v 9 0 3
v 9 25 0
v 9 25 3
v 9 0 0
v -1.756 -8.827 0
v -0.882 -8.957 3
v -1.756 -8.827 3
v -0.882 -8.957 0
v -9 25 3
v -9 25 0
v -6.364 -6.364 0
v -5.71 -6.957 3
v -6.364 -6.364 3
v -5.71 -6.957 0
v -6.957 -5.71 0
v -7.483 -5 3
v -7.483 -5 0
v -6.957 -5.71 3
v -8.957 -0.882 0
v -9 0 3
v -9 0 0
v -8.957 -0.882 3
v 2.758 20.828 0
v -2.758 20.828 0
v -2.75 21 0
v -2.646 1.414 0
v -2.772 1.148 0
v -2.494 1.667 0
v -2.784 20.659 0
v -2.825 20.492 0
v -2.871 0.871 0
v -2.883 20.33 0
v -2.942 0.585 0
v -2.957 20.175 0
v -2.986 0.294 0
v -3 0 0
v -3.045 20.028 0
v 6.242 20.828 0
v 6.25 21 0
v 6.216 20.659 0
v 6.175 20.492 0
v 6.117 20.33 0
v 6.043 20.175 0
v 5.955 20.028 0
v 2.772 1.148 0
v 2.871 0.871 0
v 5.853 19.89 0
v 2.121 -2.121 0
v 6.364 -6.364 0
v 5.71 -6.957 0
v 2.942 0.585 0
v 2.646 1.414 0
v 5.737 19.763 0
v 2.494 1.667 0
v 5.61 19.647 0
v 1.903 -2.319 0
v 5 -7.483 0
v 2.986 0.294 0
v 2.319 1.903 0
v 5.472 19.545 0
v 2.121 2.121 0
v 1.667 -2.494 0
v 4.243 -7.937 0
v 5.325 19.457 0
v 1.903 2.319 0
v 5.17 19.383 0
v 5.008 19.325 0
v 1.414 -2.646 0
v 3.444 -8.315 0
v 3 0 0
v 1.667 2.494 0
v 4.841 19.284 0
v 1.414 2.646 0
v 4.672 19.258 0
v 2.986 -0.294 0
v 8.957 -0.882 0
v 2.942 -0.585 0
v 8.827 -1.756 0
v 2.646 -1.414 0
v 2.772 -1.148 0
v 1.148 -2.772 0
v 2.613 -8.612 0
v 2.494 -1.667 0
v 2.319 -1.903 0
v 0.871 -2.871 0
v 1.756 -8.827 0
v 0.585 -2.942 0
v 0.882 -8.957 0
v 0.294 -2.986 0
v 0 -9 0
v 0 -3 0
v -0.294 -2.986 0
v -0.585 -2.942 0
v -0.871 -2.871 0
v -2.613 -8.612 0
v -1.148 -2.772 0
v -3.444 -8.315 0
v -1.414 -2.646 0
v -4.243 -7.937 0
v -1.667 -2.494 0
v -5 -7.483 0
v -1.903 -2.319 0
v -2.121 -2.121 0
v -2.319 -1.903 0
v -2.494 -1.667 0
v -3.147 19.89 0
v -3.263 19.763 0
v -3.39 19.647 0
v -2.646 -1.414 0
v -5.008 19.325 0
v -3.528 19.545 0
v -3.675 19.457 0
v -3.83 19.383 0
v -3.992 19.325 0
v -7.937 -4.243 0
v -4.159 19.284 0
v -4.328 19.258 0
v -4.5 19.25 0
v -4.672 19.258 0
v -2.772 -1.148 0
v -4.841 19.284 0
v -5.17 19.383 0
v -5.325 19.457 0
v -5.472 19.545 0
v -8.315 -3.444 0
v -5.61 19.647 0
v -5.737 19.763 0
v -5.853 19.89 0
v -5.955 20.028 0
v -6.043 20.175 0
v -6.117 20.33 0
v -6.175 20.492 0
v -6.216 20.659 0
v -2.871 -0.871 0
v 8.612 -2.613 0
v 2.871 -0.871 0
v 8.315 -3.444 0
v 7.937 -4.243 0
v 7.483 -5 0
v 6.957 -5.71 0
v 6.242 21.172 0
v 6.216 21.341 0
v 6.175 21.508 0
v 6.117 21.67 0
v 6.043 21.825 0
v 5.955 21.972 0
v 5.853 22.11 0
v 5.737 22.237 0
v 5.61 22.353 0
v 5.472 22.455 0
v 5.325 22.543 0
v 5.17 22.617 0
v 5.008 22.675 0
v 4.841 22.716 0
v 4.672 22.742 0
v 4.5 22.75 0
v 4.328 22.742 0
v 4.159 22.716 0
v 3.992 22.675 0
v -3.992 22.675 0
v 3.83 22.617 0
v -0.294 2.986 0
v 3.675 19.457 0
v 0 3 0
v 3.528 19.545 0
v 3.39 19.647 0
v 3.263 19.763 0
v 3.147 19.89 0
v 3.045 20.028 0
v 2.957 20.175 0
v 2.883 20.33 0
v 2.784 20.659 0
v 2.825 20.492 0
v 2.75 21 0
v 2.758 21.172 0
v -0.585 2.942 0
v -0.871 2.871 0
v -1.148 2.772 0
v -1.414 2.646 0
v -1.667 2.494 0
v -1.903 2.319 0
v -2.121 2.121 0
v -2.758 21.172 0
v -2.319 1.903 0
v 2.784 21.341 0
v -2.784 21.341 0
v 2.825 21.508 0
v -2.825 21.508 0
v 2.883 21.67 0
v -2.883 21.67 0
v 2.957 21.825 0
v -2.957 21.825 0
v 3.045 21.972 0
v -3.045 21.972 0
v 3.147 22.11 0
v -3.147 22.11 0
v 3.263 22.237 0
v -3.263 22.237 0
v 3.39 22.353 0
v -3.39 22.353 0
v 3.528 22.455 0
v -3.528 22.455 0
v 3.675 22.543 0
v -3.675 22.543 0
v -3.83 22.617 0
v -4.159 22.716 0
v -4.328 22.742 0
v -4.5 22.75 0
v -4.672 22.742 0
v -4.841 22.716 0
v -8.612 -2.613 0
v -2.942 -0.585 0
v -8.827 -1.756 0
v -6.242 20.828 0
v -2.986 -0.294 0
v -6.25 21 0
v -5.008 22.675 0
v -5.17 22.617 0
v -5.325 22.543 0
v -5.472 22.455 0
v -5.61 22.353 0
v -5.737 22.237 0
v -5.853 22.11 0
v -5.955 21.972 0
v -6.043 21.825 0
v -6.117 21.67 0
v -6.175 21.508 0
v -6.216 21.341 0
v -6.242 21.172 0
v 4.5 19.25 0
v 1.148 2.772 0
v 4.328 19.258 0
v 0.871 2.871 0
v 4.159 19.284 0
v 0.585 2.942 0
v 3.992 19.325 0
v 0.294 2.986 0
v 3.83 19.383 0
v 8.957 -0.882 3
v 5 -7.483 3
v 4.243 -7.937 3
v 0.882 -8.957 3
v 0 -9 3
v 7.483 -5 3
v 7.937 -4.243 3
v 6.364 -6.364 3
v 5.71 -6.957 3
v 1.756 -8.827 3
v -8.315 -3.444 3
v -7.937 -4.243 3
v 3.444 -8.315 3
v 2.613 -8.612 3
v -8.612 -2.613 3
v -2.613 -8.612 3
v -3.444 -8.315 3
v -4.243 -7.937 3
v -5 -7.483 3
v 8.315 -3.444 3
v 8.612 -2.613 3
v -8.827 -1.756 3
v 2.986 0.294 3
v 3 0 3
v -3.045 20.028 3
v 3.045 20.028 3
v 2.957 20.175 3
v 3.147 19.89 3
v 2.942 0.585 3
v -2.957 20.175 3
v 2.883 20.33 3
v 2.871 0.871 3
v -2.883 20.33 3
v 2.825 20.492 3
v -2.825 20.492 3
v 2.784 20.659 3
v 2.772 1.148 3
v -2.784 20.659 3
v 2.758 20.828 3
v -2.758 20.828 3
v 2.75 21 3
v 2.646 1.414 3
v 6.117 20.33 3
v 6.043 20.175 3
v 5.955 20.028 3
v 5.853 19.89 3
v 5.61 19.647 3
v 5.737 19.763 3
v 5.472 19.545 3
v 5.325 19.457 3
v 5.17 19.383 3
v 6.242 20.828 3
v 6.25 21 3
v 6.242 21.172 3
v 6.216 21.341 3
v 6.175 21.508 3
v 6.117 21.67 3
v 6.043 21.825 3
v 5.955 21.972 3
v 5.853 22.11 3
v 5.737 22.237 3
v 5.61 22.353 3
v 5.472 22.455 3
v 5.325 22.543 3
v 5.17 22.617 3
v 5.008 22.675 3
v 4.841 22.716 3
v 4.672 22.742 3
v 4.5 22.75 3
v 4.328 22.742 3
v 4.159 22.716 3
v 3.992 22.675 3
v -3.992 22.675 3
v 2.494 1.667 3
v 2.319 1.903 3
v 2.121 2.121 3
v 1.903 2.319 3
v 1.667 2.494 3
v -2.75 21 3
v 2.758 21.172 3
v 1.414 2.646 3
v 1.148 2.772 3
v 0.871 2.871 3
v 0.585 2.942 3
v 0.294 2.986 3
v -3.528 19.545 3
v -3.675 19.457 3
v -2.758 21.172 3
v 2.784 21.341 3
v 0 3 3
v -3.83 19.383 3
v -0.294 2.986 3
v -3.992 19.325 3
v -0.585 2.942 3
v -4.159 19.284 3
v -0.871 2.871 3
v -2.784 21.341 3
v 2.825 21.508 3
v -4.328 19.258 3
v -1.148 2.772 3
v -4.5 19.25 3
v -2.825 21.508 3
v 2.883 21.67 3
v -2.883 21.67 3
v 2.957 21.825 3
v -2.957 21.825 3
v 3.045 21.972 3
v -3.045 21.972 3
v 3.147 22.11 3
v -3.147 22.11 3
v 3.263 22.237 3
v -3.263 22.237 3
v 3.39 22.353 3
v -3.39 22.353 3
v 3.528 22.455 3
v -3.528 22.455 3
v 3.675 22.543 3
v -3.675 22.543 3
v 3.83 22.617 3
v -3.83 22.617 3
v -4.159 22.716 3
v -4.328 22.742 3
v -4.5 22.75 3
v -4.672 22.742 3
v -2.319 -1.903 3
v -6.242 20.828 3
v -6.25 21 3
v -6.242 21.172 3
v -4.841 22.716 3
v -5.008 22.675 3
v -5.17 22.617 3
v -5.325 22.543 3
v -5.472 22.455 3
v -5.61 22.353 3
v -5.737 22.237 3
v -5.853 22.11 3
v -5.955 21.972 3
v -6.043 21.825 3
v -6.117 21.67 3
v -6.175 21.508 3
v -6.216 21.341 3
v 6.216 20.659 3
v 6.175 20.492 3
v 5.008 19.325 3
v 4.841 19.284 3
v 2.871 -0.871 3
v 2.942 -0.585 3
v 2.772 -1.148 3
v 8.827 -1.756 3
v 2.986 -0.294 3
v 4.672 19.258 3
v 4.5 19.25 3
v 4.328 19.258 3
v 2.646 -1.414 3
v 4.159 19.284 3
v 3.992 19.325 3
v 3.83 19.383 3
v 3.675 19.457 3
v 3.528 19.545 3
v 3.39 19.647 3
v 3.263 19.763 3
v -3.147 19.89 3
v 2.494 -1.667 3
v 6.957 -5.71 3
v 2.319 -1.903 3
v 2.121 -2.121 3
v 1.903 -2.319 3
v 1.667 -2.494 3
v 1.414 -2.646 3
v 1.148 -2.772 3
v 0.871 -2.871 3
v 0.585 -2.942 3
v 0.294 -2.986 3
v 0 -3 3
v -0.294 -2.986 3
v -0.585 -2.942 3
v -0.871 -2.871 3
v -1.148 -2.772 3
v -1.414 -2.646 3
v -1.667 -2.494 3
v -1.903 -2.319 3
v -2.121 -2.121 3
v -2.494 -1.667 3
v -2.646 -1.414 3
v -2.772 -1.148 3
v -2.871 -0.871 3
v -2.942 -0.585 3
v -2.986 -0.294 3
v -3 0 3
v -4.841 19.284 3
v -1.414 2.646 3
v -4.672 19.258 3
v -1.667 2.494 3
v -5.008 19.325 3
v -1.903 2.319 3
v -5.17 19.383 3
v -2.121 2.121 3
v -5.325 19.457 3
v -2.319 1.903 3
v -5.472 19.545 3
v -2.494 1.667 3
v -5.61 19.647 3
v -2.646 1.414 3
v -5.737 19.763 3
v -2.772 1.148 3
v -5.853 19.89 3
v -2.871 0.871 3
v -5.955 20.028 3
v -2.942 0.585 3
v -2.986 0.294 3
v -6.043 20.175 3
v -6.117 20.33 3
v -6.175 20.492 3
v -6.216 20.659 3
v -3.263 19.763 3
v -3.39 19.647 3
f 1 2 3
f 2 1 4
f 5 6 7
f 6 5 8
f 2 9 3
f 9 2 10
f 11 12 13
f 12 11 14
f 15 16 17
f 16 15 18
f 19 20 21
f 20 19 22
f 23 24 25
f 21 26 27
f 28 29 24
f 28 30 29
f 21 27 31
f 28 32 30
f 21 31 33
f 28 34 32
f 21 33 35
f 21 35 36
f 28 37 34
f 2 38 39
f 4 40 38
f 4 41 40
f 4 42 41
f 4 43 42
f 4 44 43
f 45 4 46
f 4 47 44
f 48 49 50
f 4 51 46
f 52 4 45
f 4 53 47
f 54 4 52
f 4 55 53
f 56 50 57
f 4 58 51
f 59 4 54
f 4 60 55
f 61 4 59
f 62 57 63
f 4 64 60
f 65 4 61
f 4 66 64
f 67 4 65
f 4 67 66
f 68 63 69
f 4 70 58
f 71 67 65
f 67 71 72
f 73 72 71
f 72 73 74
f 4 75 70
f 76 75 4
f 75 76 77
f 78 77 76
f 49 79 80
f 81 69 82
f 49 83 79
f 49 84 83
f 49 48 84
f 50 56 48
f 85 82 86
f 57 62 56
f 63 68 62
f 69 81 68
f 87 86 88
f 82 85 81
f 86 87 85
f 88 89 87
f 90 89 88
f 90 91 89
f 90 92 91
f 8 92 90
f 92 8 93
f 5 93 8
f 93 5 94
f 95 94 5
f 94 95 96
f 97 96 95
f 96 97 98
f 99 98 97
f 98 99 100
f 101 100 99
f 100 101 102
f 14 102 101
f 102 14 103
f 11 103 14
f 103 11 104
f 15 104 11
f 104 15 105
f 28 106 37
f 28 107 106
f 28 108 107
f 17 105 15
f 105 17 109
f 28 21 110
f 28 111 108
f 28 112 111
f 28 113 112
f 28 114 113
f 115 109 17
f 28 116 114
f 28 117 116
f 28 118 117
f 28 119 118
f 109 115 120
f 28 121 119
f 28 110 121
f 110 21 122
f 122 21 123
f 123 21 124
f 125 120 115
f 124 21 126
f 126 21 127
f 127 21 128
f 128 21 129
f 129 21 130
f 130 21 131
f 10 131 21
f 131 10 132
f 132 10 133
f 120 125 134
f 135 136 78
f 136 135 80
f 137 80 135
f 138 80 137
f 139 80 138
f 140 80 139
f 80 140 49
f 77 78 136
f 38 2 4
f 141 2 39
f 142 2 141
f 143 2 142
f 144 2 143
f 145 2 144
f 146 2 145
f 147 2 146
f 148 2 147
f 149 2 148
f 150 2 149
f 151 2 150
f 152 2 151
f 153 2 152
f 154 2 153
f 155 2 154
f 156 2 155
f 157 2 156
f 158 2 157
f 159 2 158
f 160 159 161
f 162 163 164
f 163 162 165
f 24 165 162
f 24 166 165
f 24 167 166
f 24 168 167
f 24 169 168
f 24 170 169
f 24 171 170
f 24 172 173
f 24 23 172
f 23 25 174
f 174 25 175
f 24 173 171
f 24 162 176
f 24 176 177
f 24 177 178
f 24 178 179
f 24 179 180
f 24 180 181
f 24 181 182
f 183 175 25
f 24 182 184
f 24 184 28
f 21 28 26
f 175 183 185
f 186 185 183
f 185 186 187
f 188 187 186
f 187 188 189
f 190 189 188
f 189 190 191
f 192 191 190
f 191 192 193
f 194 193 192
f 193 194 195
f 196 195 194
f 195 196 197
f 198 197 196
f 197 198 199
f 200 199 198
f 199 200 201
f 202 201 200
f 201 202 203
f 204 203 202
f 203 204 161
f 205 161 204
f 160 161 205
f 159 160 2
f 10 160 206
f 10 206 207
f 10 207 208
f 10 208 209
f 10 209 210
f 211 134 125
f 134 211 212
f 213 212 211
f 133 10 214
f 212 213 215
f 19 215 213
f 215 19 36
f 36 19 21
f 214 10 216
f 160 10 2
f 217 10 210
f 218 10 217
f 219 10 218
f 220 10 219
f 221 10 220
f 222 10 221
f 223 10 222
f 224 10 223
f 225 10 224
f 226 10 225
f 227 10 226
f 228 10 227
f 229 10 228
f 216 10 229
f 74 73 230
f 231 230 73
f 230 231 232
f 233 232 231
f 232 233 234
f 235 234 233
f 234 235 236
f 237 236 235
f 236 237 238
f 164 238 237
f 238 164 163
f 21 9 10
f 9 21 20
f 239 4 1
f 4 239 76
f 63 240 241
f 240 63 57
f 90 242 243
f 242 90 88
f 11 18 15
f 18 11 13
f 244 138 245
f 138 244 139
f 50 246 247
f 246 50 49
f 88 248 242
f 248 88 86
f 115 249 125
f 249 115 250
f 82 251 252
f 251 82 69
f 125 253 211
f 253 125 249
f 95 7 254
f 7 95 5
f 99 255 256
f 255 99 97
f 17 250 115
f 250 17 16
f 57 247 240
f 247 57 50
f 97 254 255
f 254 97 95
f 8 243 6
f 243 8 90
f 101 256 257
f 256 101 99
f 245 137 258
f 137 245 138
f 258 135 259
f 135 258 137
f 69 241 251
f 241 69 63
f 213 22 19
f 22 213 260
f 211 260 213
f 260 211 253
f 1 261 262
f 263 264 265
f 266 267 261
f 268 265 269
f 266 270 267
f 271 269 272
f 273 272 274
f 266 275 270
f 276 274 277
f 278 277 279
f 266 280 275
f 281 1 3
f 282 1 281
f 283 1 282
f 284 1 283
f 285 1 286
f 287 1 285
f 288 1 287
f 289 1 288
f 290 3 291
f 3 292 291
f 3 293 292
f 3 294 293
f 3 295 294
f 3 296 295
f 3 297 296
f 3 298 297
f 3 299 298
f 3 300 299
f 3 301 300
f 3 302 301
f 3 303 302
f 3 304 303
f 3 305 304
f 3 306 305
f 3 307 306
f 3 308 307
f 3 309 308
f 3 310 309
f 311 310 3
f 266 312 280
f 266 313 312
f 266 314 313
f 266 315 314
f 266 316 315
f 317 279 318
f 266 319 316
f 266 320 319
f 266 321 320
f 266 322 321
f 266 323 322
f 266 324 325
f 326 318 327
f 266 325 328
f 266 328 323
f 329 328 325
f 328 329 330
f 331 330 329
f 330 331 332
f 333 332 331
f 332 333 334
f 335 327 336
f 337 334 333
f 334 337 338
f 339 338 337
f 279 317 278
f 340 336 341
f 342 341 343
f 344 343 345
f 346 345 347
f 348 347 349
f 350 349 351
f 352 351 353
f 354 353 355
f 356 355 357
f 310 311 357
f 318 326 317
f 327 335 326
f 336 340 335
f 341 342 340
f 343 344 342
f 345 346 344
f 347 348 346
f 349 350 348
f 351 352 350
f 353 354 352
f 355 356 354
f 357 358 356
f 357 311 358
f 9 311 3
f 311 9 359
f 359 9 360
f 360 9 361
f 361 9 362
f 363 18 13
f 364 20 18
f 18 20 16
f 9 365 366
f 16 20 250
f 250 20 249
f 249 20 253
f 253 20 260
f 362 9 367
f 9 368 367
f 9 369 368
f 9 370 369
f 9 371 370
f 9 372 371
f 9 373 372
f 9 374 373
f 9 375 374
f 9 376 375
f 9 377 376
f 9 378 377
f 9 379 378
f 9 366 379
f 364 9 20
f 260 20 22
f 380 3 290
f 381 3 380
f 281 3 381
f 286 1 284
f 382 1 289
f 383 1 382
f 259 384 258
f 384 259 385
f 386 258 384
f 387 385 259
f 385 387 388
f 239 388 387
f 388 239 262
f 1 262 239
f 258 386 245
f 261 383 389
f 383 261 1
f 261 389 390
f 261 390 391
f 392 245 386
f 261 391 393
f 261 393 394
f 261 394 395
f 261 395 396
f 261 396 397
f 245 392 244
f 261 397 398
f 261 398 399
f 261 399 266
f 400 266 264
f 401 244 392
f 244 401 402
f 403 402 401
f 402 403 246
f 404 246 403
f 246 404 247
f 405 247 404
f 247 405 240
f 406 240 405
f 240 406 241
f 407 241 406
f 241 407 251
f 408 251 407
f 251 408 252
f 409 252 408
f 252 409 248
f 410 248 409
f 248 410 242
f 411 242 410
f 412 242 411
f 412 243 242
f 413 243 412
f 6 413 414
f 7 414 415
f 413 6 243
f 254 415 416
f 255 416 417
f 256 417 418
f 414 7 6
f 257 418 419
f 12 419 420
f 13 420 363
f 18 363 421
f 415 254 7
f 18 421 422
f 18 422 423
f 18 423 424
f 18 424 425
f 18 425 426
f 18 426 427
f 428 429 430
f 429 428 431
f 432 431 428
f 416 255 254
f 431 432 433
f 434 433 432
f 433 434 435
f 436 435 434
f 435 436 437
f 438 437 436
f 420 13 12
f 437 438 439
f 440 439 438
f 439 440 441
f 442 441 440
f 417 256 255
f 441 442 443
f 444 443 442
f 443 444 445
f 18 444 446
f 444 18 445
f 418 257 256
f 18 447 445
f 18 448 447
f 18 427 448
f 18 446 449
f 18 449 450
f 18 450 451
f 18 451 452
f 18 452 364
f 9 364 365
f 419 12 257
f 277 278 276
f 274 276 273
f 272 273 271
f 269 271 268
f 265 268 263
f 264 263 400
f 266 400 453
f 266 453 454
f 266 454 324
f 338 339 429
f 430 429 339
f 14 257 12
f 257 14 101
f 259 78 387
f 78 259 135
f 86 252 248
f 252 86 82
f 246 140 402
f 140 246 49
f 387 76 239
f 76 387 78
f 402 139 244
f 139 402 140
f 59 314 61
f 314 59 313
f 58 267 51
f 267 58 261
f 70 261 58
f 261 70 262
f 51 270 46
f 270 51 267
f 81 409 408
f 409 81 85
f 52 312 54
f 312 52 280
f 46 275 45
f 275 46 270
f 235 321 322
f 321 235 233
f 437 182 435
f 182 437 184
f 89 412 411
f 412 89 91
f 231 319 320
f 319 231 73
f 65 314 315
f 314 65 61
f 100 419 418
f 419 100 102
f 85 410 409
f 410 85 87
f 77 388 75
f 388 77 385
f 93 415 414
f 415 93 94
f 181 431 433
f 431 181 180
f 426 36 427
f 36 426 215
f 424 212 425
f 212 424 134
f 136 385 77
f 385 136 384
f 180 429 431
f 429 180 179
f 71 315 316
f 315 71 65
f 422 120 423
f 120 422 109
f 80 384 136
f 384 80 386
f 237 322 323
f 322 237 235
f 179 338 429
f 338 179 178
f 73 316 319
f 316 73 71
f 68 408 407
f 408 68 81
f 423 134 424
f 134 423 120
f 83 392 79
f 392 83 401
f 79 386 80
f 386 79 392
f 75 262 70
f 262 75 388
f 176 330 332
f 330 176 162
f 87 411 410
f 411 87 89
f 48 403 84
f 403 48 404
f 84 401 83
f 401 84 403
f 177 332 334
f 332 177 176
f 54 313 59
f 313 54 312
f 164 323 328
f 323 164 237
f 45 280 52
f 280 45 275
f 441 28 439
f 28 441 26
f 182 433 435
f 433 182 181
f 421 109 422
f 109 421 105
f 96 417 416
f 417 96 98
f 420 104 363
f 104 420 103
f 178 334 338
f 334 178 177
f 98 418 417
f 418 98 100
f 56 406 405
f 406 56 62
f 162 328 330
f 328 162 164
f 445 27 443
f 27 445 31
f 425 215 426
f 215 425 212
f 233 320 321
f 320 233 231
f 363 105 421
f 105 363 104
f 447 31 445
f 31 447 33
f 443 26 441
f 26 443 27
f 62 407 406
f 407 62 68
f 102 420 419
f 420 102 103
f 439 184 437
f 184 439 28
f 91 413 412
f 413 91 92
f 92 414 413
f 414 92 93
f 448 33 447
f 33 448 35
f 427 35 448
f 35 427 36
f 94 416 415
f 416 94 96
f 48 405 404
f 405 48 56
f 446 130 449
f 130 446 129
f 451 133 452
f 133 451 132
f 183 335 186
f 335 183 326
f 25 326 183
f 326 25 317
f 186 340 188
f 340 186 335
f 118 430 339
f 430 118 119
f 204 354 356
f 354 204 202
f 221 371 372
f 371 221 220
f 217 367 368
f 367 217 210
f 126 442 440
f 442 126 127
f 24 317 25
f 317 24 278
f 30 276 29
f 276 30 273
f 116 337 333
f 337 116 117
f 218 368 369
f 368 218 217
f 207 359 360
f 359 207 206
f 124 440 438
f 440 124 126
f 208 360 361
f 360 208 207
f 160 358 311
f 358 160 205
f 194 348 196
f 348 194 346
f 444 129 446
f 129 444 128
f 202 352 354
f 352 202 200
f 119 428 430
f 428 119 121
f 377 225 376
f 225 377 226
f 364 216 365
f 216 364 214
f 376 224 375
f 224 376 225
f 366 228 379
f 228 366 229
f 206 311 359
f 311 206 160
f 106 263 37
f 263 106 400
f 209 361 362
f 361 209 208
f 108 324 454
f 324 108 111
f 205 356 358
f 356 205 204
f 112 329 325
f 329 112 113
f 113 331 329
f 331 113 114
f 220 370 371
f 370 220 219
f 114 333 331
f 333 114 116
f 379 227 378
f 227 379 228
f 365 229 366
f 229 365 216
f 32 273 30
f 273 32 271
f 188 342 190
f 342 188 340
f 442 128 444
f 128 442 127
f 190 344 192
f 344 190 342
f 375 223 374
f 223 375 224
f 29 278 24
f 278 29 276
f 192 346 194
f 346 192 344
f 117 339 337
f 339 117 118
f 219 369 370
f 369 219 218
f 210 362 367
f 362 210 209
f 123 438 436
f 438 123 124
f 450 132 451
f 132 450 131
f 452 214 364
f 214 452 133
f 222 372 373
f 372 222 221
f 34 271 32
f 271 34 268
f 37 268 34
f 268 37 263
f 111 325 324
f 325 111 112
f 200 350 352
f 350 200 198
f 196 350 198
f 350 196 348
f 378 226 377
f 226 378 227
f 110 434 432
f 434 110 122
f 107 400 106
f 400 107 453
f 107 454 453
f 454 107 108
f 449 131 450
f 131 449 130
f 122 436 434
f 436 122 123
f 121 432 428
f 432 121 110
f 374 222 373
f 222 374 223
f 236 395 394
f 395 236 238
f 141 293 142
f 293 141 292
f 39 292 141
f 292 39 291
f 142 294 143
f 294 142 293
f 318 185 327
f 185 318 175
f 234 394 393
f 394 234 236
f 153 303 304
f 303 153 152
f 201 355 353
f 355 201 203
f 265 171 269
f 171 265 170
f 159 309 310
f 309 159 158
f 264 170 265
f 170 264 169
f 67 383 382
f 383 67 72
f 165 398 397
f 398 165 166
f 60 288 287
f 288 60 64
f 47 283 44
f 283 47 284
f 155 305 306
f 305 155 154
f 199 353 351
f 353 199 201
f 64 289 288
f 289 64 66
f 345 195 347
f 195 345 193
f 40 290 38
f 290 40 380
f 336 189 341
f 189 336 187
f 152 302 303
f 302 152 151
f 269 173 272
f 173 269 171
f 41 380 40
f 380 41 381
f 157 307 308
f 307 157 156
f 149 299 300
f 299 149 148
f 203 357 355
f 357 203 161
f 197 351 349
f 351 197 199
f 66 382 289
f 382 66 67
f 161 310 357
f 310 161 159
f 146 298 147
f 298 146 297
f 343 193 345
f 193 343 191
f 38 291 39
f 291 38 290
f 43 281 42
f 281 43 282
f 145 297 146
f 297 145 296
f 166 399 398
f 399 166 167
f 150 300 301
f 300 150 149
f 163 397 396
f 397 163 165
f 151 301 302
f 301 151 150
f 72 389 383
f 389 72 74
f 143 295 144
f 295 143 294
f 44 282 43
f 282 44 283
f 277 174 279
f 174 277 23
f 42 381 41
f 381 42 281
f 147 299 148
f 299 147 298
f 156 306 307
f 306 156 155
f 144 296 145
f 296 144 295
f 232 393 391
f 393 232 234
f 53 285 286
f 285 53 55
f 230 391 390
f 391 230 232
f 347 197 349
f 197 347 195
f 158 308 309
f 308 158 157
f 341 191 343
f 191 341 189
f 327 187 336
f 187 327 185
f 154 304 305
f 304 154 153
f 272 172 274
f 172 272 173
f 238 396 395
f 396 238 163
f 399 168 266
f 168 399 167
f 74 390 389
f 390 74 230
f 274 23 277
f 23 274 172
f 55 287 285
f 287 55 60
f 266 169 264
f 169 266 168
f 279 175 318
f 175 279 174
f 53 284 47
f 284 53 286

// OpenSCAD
// file: ../envelopes/servo-arm-envelope.scad
servoArmEnvelope();

module servoArmEnvelope(hole_h = 7, arm_h = 2) {
    union() {
        translate([0, 0, 0])
        hull() {
            cylinder(h = arm_h, r = 3, center = false, $fn = 64);

            translate([0, 15.0, 0])
                cylinder(h = arm_h, r = 1.5, center = false, $fn = 64);
        }
        cylinder(h = hole_h, r = 2.8, center = true, $fn = 64);
    }
}
// main file
use <../envelopes/servo-arm-envelope.scad>


/**
 * hipSupportPieceB
 * @name hipSupportPieceB
 * @description Holds the hip component
 * @type piece
 * @parent LegHipComponent
 * @stl
 */
module hipSupportPieceB(
    length = 25,
    width = 18
) {
    thickness = 3;
    hole_diameter = 6;

    screw_hole_diameter = 3.5;

    difference() {
        hull() {
            cylinder(h = thickness, r = width / 2, center = false, $fn = 64);
            
            translate([0, length - 1, thickness / 2])
                cube([width, 2, thickness], center = true);
        }

        cylinder(h = thickness * 5, r = hole_diameter / 2, center = true, $fn = 64);

        // Screw holes
        translate([-4.5, length - 4, 0])
            cylinder(h = thickness * 5, r = screw_hole_diameter / 2, center = true, $fn = 64);

        translate([4.5, length - 4, 0])
            cylinder(h = thickness * 5, r = screw_hole_diameter / 2, center = true, $fn = 64);
    }
}


/**
 * @stl
 * @png
 * @colorscheme BeforeDawn
 * @view axes,scales
 */
hipSupportPieceB();
